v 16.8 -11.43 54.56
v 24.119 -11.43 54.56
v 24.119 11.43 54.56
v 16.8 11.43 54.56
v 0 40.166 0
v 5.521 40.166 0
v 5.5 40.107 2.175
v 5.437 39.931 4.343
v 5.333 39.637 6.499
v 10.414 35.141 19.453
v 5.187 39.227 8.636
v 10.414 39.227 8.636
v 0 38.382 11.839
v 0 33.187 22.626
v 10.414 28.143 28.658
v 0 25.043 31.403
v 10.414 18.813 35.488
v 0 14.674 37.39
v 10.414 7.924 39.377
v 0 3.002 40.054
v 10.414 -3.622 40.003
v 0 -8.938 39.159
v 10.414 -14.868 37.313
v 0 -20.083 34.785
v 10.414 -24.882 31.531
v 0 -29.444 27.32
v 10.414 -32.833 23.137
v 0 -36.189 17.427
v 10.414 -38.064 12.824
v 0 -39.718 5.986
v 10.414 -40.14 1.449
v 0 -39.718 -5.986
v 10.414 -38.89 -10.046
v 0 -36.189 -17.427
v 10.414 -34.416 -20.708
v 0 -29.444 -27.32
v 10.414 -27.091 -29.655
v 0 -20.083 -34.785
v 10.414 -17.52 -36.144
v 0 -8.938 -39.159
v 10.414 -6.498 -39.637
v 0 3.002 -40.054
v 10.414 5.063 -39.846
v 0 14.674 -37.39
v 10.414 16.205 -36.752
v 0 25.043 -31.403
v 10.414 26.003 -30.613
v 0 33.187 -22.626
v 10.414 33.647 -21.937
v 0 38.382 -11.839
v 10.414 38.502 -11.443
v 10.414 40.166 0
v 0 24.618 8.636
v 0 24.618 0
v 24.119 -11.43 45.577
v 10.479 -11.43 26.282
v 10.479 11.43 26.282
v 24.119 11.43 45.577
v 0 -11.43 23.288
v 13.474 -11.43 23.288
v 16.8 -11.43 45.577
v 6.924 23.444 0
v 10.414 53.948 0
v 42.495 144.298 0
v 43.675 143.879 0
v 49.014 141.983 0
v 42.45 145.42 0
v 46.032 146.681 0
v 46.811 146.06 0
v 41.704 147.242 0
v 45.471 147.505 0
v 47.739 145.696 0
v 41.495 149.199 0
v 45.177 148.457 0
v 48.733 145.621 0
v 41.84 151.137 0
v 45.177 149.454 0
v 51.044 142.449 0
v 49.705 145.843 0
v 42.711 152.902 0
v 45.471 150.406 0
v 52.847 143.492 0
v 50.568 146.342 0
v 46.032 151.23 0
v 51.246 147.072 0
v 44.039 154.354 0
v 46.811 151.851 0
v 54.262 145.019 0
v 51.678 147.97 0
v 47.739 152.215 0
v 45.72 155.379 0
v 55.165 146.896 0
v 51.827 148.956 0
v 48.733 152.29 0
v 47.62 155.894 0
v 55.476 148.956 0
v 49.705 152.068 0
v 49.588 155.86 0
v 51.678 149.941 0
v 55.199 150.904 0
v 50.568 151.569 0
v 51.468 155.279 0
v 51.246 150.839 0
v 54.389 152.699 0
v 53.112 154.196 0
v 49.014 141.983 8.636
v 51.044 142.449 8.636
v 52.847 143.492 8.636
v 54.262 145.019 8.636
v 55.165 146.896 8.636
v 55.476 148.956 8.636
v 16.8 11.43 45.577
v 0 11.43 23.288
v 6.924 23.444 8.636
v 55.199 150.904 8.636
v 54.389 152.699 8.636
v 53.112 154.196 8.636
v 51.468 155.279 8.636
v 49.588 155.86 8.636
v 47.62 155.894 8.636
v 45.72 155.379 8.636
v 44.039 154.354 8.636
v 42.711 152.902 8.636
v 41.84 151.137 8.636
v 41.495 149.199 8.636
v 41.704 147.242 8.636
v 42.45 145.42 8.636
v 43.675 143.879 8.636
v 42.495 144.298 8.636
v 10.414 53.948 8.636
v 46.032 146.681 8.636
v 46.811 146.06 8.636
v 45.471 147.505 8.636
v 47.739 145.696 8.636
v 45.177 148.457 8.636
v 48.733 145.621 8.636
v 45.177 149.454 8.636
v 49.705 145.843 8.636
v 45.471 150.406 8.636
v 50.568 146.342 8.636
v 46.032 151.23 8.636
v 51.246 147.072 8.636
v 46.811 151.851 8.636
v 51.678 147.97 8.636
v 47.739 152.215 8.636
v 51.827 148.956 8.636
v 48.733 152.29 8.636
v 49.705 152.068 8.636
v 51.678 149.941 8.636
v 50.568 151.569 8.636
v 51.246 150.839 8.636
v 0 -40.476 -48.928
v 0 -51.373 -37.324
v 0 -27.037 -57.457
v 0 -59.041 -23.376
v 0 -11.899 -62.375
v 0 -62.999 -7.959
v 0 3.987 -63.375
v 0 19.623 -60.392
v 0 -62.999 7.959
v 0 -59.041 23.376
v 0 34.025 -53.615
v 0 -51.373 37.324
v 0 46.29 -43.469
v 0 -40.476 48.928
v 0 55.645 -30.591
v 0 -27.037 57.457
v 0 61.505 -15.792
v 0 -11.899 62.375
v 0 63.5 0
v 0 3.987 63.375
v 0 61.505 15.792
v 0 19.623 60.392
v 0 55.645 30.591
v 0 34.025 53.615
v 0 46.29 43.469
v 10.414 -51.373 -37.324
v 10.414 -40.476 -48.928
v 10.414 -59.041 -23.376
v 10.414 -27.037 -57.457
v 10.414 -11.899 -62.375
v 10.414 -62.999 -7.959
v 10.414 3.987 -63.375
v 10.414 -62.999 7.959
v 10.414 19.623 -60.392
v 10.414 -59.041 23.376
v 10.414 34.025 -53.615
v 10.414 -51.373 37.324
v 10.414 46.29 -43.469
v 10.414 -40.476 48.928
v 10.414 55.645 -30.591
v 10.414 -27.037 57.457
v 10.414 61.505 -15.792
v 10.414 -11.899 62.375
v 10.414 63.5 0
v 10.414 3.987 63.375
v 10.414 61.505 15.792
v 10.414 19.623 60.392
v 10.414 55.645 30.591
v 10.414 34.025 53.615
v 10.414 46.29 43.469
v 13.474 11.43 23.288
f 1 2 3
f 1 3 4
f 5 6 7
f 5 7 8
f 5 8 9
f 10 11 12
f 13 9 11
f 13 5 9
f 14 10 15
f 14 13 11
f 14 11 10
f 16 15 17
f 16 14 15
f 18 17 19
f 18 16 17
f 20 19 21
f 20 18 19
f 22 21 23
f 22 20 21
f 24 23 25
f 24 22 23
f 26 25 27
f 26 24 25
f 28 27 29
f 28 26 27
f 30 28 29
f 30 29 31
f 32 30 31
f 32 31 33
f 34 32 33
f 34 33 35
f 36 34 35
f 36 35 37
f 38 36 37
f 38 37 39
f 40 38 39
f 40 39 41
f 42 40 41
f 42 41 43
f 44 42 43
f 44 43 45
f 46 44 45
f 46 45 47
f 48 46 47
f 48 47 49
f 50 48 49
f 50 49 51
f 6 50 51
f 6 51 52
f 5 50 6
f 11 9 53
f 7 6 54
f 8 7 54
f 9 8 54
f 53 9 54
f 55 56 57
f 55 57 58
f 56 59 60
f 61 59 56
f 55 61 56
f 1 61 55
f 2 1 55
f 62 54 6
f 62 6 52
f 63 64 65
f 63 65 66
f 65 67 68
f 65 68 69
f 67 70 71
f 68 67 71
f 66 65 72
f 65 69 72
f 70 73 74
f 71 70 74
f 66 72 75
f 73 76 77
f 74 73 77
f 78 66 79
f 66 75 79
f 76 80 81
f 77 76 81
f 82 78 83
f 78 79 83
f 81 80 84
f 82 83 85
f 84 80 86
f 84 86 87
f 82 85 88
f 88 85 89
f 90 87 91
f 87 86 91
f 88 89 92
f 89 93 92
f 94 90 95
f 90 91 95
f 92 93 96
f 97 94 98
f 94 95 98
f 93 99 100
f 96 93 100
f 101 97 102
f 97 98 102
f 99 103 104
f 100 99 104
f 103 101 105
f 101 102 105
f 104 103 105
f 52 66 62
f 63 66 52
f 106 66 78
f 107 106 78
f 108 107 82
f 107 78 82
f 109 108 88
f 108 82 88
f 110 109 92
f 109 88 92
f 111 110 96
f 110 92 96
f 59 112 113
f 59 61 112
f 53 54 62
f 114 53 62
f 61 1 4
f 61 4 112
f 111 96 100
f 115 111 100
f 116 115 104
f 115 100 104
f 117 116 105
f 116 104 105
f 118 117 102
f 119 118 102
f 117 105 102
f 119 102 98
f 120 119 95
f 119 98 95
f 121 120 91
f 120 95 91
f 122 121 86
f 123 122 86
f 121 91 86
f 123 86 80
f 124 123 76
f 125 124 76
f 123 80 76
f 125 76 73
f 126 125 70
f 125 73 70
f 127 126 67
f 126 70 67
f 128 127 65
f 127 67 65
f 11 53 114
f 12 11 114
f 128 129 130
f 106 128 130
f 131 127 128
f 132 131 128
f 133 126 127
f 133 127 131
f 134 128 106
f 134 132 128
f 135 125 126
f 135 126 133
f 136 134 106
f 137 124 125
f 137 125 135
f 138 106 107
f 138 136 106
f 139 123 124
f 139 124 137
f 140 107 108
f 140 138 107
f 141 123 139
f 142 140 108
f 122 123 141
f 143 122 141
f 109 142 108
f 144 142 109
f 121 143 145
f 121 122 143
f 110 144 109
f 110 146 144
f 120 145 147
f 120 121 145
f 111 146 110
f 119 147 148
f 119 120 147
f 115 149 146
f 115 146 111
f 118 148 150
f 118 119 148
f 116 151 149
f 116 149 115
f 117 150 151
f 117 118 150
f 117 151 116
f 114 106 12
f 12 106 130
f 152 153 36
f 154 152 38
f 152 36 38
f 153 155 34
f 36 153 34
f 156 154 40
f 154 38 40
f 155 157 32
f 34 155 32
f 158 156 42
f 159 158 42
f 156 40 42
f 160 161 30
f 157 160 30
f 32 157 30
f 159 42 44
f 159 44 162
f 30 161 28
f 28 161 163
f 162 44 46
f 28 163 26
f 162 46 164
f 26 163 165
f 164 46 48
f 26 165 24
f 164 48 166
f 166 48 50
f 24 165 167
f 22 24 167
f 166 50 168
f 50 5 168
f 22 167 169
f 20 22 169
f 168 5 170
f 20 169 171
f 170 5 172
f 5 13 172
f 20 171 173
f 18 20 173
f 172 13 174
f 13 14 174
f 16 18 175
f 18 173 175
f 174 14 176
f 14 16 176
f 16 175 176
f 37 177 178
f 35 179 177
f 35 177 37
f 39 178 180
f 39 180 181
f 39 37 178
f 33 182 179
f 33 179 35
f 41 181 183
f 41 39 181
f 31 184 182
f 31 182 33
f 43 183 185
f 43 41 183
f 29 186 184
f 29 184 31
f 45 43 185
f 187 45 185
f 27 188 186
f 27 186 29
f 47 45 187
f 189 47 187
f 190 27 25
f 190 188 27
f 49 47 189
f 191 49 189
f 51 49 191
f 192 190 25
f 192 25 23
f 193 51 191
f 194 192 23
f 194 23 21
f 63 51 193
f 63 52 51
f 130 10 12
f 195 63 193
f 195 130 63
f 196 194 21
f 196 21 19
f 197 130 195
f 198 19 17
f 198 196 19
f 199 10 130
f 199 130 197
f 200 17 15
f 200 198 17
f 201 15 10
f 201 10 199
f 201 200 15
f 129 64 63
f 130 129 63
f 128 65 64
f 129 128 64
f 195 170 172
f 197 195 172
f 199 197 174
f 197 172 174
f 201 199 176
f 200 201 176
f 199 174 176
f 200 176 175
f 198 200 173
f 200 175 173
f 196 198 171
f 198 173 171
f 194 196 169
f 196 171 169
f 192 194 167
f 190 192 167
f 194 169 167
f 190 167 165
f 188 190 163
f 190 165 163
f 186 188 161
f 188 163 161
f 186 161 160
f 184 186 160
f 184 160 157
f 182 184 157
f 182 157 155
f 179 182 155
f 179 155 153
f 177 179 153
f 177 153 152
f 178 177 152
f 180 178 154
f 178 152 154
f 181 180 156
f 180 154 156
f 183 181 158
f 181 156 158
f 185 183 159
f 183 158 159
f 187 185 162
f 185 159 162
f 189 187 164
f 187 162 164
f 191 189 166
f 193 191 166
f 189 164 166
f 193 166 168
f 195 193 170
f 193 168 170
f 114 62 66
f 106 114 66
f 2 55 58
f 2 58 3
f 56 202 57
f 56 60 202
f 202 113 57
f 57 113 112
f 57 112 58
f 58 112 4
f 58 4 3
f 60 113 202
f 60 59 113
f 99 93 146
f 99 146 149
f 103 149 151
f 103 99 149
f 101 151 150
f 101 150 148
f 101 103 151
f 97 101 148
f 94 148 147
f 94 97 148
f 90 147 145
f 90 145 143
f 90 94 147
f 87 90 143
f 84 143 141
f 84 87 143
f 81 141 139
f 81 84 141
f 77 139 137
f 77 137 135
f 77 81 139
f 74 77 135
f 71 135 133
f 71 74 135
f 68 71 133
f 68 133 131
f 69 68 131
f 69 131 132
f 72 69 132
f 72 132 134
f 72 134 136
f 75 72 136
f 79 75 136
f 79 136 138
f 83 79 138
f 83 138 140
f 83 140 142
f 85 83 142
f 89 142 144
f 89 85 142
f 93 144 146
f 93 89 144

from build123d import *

# Parameters (mm, degrees)
F1_R     = 3.3434072236
F2_DEPTH = 8.636
F0_R     = 63.5
F0_R_2   = 40.1662219946
F3_DEPTH = 10.414
F5_DEPTH = 11.43


# Not quite as in the source:
# - a feature of the source that left no trace in its solid (it failed there, or was rolled back) is left out


with BuildPart() as f2:
    # F1 (on Top) → F2 (new body)
    with BuildSketch(Plane.XY):
        with BuildLine():
            Line((42.4949078619, 144.2979639482), (0, 24.6184635907))
            Line((0, 24.6184635907), (6.9236060732, 23.4437996919))
            Line((6.9236060732, 23.4437996919), (49.013733896, 141.9833076298))
            ThreePointArc((49.013733896, 141.9833076298), (46.1434978735, 142.3662019346), (43.6745030246, 143.8791220613))
            Line((43.6745030246, 143.8791220613), (42.4949078619, 144.2979639482))
        make_face()
        with BuildLine():
            ThreePointArc((55.4755375751, 148.9555081438), (45.7201126941, 155.3787883051), (43.6745030246, 143.8791220613))
            Line((43.6745030246, 143.8791220613), (49.013733896, 141.9833076298))
            ThreePointArc((49.013733896, 141.9833076298), (53.6116733091, 144.2024436904), (55.4755375751, 148.9555081438))
        make_face()
        with Locations((48.4831797689, 148.9555081438)):
            Circle(F1_R, mode=Mode.SUBTRACT)
        with BuildLine():
            Line((49.013733896, 141.9833076298), (43.6745030246, 143.8791220613))
            ThreePointArc((43.6745030246, 143.8791220613), (46.1434978735, 142.3662019346), (49.013733896, 141.9833076298))
        make_face()
    extrude(amount=F2_DEPTH)

    # F0 (on Right) → F3 (join)
    with BuildSketch(Plane.YZ):
        Circle(F0_R)
        Circle(F0_R_2, mode=Mode.SUBTRACT)
    extrude(amount=F3_DEPTH)


with BuildPart() as f5:
    # F4 (on Front) → F5 (new body, symmetric)
    with BuildSketch(Plane.XZ):
        Polygon((13.473616913, 23.2877340168), (10.4794809595, 26.2818709016), (24.1194386035, 45.5774255097), (24.1194386035, 54.5598343015), (16.8004371226, 54.5598343015), (16.8004371226, 45.5774255097), (0, 23.2877340168), align=None)
    extrude(amount=F5_DEPTH, both=True)


solid = Compound([f2.part, f5.part])
